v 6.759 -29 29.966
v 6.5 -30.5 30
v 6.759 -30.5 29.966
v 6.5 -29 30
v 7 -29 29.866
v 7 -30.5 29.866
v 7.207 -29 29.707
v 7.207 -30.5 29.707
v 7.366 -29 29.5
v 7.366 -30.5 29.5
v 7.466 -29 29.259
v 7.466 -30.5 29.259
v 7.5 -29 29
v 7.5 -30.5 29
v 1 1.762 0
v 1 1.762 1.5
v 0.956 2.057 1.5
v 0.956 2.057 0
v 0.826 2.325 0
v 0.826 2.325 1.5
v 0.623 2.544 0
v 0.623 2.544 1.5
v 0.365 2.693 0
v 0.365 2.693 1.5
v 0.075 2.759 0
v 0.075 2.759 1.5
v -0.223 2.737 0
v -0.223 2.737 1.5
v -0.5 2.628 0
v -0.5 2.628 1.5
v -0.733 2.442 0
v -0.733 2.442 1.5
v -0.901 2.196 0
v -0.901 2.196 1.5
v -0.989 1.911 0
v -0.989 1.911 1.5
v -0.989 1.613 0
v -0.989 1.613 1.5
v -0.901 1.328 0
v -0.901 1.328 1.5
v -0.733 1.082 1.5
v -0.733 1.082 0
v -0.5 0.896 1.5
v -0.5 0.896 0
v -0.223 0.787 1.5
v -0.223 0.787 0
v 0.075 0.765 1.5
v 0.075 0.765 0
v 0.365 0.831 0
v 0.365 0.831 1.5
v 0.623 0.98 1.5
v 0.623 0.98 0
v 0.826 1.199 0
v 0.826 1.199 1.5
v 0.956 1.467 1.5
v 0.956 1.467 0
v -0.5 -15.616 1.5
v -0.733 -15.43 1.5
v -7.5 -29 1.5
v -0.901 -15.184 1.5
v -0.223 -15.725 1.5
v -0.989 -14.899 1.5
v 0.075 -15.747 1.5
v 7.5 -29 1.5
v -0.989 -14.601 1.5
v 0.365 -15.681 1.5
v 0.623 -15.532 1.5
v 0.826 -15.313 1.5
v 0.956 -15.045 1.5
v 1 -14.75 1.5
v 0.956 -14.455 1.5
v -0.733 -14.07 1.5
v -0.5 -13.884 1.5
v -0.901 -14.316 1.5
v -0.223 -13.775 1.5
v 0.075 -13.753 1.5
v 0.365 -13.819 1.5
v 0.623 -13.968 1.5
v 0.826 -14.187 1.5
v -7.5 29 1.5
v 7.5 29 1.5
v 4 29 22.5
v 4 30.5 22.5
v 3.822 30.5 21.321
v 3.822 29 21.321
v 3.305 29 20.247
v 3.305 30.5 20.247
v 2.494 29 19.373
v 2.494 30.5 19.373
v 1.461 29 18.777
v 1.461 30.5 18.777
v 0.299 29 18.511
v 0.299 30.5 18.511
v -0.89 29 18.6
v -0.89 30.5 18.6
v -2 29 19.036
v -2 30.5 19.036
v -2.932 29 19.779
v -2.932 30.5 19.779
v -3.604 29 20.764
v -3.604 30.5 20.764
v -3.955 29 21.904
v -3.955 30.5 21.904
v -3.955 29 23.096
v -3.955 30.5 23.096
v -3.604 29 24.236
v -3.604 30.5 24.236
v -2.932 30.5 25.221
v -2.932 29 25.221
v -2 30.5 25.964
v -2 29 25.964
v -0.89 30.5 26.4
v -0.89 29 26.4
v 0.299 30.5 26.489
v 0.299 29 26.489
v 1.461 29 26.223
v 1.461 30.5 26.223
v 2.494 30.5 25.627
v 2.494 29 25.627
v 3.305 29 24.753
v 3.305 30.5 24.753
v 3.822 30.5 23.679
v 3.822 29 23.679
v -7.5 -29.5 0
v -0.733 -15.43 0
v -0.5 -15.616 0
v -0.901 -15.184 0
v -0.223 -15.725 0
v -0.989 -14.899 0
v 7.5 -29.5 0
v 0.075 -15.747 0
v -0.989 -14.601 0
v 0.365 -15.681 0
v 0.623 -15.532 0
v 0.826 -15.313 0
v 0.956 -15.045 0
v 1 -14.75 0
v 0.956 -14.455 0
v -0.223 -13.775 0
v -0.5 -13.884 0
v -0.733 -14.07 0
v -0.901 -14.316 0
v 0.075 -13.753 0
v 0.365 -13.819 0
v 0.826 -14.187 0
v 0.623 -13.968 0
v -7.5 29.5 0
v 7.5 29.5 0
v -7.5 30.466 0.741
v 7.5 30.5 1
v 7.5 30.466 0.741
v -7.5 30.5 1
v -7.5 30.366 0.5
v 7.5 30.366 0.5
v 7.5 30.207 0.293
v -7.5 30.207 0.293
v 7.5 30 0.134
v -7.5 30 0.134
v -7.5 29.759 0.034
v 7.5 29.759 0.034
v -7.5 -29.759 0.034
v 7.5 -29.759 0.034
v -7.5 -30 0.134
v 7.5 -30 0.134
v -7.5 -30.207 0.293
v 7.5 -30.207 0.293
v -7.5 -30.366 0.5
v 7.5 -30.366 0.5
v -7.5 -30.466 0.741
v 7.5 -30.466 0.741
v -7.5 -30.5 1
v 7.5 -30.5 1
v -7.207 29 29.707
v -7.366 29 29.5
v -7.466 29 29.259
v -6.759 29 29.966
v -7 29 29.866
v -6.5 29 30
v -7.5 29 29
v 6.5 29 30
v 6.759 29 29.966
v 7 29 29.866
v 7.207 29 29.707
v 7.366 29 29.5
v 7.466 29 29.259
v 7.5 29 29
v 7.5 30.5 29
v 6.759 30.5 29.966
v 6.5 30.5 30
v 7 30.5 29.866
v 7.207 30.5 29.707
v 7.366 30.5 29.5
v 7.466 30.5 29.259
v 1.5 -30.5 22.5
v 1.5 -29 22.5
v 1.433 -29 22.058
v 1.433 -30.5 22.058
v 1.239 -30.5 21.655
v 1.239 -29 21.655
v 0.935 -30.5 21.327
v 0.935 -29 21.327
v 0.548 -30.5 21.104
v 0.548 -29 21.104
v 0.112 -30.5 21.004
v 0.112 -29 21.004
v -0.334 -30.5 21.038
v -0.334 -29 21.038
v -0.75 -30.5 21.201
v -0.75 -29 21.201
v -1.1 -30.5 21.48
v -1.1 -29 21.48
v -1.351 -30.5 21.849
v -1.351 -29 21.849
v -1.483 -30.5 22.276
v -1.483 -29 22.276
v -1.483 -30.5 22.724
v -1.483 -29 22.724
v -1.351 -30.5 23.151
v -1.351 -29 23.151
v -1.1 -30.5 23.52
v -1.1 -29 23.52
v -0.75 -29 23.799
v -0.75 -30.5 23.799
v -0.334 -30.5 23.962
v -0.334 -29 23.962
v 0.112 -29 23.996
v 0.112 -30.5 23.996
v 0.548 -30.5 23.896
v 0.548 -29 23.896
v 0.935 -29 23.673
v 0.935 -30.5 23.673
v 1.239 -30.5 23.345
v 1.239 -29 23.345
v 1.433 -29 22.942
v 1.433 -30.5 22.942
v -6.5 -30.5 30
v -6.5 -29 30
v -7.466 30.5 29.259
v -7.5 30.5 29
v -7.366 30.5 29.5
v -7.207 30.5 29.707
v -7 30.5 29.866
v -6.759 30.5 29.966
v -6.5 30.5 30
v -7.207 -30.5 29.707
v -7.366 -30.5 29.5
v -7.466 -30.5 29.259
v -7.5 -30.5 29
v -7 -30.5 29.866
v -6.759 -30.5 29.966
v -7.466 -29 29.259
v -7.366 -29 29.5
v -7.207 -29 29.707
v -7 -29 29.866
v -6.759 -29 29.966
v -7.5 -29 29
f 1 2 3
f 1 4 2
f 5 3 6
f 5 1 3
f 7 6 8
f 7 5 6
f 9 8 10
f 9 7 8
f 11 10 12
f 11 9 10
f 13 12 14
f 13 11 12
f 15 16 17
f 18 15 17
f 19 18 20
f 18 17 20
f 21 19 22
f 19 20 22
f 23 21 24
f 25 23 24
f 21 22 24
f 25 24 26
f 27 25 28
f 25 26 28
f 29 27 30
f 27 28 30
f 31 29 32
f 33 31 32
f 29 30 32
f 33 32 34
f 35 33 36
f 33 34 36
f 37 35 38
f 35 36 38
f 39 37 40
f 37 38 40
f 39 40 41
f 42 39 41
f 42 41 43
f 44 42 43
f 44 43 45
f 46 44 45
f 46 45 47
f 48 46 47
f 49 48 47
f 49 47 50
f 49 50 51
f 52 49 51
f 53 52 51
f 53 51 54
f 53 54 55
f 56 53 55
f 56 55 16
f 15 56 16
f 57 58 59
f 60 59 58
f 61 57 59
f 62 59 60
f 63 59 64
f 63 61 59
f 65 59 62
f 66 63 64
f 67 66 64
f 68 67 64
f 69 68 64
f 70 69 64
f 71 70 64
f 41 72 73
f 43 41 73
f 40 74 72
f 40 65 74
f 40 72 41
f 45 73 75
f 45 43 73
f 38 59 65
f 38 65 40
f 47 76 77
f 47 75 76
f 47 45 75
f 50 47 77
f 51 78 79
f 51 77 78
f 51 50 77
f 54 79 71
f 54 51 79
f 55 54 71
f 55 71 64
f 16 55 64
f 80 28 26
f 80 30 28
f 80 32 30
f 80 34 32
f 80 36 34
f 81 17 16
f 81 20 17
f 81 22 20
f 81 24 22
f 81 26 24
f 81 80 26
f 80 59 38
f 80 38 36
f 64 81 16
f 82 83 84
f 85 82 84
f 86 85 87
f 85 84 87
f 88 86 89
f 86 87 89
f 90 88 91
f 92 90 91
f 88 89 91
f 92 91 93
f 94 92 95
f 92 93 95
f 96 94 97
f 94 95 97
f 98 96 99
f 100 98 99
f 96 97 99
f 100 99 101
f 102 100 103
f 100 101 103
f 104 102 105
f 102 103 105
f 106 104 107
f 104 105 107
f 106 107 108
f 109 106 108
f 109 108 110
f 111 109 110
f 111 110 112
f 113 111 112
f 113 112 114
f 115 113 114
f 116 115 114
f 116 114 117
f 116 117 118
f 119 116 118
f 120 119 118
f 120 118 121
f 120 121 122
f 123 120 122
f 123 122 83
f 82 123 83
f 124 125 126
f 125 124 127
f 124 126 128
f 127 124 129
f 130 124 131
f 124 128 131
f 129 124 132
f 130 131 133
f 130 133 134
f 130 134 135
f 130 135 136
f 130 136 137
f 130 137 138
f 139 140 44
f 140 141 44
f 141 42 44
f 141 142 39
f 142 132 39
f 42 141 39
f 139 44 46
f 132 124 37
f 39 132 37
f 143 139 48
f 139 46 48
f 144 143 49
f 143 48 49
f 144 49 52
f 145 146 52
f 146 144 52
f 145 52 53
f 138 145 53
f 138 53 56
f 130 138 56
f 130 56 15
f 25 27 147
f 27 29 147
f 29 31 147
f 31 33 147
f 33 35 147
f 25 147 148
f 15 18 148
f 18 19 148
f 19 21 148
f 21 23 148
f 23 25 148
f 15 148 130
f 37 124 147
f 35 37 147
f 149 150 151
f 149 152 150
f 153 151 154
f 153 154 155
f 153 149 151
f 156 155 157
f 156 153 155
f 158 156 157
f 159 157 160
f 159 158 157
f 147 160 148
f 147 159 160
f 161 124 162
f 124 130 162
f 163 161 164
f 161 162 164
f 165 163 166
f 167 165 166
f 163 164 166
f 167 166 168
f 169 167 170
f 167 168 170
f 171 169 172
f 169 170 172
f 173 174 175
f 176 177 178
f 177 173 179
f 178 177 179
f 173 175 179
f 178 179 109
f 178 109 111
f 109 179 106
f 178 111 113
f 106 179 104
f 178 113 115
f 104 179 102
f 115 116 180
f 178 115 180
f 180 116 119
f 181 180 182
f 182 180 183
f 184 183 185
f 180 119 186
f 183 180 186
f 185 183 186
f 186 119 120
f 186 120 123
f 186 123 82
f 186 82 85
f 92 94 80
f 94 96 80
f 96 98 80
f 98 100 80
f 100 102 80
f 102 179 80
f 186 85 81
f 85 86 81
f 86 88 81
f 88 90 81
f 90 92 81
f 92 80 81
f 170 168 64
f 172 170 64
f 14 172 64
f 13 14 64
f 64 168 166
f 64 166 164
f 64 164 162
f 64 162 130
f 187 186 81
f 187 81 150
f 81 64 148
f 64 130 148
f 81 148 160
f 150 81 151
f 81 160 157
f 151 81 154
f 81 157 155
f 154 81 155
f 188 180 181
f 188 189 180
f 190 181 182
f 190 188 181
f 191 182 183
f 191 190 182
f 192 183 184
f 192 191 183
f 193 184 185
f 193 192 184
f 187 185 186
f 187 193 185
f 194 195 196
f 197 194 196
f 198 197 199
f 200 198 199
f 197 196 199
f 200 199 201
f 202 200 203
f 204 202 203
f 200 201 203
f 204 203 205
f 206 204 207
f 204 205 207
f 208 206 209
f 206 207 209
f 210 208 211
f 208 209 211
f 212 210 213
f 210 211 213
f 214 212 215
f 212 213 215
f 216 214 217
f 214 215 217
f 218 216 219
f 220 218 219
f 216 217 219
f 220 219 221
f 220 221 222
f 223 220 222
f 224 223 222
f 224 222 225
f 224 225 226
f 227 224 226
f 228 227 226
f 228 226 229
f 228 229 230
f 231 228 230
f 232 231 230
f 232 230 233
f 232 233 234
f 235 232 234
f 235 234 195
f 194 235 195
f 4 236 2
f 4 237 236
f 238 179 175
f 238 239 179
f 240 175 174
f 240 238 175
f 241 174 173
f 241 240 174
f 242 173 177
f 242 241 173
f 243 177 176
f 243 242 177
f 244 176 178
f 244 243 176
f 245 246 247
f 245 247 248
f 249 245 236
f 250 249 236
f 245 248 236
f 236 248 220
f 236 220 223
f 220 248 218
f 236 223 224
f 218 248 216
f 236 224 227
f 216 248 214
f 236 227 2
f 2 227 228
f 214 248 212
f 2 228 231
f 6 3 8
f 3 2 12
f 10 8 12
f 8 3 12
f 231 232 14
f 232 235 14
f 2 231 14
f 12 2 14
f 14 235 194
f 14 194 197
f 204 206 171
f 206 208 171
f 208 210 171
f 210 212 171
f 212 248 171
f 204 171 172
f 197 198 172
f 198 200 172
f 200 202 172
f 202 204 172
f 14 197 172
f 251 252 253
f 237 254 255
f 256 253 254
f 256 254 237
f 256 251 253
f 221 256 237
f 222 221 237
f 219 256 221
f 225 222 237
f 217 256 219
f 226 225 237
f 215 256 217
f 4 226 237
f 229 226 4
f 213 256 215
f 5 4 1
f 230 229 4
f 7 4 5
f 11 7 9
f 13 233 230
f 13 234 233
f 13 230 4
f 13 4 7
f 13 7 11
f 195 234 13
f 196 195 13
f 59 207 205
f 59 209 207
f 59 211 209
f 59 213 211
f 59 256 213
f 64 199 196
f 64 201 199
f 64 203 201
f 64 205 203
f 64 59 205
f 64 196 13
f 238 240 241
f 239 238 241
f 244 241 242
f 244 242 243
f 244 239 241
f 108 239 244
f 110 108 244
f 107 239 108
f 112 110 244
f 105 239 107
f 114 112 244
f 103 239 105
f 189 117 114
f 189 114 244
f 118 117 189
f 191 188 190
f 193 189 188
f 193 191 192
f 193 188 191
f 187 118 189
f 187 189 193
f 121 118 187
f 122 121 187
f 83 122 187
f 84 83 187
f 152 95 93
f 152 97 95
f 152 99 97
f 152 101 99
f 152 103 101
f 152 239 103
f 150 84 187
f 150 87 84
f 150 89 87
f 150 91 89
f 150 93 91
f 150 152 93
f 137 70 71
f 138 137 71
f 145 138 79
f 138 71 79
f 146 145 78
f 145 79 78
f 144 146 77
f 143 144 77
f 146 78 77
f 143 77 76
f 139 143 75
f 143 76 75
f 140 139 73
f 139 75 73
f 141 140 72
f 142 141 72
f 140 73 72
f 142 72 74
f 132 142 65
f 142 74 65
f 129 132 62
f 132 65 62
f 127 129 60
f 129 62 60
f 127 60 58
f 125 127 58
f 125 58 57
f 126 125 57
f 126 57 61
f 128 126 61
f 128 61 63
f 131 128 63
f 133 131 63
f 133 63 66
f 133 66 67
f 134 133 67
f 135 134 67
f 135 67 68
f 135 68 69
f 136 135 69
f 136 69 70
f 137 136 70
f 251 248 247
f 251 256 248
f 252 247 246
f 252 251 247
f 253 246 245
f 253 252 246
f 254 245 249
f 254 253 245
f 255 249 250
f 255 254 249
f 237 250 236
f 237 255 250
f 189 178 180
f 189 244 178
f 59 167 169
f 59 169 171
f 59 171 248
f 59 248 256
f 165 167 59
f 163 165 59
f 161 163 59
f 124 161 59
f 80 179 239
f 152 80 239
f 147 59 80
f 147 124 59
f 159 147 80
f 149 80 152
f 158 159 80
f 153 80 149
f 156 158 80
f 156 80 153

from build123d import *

# Parameters (mm, degrees)
BOSS_EXTRUDE1_DEPTH = 1.5
SKETCH2_W           = 15
SKETCH2_H           = 1.5
BOSS_EXTRUDE2_DEPTH = 28.5
SKETCH3_R           = 1.5
CUT_EXTRUDE1_DEPTH  = 62
FILLET1_R           = 1
CUT_EXTRUDE2_REACH  = 63
SKETCH5_R           = 4
SKETCH6_R           = 1
CUT_EXTRUDE3_DEPTH  = 10


with BuildPart() as part:
    # Sketch1 → Boss-Extrude1 (new body)
    with BuildSketch(Plane.XY):
        Polygon((-7.5, -23.042592662), (-7.5, -30.5), (7.5, -30.5), (7.5, -23.042592662), (7.5, 26.84732779), (7.5, 30.5), (-7.5, 30.5), (-7.5, 26.84732779), align=None)
    extrude(amount=BOSS_EXTRUDE1_DEPTH)

    # Sketch2 → Boss-Extrude2 (add)
    with BuildSketch(Plane.XY.offset(1.5)):
        with Locations((0, 29.75)):
            Rectangle(SKETCH2_W, SKETCH2_H)
        with Locations((0, -29.75)):
            Rectangle(SKETCH2_W, SKETCH2_H)
    extrude(amount=BOSS_EXTRUDE2_DEPTH)

    # Sketch3 → Cut-Extrude1 (cut, through all)
    with BuildSketch(Plane(origin=(0, 30.5, 0), x_dir=(1, 0, 0), z_dir=(0, 1, 0))):
        with Locations((0, -22.5)):
            Circle(SKETCH3_R)
    extrude(amount=-CUT_EXTRUDE1_DEPTH, mode=Mode.SUBTRACT)

    # Fillet1
    fillet1_edges = [part.edges().sort_by_distance(p)[0] for p in [
        (0, -30.5, 0),
        (-7.5, -29.75, 30),
        (7.5, -29.75, 30),
        (7.5, 29.75, 30),
        (-7.5, 29.75, 30),
        (0, 30.5, 0),
    ]]
    fillet(fillet1_edges, radius=FILLET1_R)

    # Sketch5 → Cut-Extrude2 (cut, up to next)
    with BuildSketch(Plane(origin=(0, 30.5, 0), x_dir=(1, 0, 0), z_dir=(0, 1, 0)), mode=Mode.PRIVATE) as cut_extrude2_sk1:
        with Locations((0, -22.5)):
            Circle(SKETCH5_R)
    cut_extrude2_tool1 = extrude(cut_extrude2_sk1.sketch, amount=-CUT_EXTRUDE2_REACH, mode=Mode.PRIVATE) & part.part
    add(cut_extrude2_tool1.solids().sort_by_distance((0, 30.5, 22.5))[0], mode=Mode.SUBTRACT)

    # Sketch6 → Cut-Extrude3 (cut)
    with BuildSketch(Plane.XY.offset(1.5)):
        with Locations((0, -14.75)):
            Circle(SKETCH6_R)
        with Locations((0, 1.762)):
            Circle(SKETCH6_R)
    extrude(amount=-CUT_EXTRUDE3_DEPTH, mode=Mode.SUBTRACT)


solid = part.part
